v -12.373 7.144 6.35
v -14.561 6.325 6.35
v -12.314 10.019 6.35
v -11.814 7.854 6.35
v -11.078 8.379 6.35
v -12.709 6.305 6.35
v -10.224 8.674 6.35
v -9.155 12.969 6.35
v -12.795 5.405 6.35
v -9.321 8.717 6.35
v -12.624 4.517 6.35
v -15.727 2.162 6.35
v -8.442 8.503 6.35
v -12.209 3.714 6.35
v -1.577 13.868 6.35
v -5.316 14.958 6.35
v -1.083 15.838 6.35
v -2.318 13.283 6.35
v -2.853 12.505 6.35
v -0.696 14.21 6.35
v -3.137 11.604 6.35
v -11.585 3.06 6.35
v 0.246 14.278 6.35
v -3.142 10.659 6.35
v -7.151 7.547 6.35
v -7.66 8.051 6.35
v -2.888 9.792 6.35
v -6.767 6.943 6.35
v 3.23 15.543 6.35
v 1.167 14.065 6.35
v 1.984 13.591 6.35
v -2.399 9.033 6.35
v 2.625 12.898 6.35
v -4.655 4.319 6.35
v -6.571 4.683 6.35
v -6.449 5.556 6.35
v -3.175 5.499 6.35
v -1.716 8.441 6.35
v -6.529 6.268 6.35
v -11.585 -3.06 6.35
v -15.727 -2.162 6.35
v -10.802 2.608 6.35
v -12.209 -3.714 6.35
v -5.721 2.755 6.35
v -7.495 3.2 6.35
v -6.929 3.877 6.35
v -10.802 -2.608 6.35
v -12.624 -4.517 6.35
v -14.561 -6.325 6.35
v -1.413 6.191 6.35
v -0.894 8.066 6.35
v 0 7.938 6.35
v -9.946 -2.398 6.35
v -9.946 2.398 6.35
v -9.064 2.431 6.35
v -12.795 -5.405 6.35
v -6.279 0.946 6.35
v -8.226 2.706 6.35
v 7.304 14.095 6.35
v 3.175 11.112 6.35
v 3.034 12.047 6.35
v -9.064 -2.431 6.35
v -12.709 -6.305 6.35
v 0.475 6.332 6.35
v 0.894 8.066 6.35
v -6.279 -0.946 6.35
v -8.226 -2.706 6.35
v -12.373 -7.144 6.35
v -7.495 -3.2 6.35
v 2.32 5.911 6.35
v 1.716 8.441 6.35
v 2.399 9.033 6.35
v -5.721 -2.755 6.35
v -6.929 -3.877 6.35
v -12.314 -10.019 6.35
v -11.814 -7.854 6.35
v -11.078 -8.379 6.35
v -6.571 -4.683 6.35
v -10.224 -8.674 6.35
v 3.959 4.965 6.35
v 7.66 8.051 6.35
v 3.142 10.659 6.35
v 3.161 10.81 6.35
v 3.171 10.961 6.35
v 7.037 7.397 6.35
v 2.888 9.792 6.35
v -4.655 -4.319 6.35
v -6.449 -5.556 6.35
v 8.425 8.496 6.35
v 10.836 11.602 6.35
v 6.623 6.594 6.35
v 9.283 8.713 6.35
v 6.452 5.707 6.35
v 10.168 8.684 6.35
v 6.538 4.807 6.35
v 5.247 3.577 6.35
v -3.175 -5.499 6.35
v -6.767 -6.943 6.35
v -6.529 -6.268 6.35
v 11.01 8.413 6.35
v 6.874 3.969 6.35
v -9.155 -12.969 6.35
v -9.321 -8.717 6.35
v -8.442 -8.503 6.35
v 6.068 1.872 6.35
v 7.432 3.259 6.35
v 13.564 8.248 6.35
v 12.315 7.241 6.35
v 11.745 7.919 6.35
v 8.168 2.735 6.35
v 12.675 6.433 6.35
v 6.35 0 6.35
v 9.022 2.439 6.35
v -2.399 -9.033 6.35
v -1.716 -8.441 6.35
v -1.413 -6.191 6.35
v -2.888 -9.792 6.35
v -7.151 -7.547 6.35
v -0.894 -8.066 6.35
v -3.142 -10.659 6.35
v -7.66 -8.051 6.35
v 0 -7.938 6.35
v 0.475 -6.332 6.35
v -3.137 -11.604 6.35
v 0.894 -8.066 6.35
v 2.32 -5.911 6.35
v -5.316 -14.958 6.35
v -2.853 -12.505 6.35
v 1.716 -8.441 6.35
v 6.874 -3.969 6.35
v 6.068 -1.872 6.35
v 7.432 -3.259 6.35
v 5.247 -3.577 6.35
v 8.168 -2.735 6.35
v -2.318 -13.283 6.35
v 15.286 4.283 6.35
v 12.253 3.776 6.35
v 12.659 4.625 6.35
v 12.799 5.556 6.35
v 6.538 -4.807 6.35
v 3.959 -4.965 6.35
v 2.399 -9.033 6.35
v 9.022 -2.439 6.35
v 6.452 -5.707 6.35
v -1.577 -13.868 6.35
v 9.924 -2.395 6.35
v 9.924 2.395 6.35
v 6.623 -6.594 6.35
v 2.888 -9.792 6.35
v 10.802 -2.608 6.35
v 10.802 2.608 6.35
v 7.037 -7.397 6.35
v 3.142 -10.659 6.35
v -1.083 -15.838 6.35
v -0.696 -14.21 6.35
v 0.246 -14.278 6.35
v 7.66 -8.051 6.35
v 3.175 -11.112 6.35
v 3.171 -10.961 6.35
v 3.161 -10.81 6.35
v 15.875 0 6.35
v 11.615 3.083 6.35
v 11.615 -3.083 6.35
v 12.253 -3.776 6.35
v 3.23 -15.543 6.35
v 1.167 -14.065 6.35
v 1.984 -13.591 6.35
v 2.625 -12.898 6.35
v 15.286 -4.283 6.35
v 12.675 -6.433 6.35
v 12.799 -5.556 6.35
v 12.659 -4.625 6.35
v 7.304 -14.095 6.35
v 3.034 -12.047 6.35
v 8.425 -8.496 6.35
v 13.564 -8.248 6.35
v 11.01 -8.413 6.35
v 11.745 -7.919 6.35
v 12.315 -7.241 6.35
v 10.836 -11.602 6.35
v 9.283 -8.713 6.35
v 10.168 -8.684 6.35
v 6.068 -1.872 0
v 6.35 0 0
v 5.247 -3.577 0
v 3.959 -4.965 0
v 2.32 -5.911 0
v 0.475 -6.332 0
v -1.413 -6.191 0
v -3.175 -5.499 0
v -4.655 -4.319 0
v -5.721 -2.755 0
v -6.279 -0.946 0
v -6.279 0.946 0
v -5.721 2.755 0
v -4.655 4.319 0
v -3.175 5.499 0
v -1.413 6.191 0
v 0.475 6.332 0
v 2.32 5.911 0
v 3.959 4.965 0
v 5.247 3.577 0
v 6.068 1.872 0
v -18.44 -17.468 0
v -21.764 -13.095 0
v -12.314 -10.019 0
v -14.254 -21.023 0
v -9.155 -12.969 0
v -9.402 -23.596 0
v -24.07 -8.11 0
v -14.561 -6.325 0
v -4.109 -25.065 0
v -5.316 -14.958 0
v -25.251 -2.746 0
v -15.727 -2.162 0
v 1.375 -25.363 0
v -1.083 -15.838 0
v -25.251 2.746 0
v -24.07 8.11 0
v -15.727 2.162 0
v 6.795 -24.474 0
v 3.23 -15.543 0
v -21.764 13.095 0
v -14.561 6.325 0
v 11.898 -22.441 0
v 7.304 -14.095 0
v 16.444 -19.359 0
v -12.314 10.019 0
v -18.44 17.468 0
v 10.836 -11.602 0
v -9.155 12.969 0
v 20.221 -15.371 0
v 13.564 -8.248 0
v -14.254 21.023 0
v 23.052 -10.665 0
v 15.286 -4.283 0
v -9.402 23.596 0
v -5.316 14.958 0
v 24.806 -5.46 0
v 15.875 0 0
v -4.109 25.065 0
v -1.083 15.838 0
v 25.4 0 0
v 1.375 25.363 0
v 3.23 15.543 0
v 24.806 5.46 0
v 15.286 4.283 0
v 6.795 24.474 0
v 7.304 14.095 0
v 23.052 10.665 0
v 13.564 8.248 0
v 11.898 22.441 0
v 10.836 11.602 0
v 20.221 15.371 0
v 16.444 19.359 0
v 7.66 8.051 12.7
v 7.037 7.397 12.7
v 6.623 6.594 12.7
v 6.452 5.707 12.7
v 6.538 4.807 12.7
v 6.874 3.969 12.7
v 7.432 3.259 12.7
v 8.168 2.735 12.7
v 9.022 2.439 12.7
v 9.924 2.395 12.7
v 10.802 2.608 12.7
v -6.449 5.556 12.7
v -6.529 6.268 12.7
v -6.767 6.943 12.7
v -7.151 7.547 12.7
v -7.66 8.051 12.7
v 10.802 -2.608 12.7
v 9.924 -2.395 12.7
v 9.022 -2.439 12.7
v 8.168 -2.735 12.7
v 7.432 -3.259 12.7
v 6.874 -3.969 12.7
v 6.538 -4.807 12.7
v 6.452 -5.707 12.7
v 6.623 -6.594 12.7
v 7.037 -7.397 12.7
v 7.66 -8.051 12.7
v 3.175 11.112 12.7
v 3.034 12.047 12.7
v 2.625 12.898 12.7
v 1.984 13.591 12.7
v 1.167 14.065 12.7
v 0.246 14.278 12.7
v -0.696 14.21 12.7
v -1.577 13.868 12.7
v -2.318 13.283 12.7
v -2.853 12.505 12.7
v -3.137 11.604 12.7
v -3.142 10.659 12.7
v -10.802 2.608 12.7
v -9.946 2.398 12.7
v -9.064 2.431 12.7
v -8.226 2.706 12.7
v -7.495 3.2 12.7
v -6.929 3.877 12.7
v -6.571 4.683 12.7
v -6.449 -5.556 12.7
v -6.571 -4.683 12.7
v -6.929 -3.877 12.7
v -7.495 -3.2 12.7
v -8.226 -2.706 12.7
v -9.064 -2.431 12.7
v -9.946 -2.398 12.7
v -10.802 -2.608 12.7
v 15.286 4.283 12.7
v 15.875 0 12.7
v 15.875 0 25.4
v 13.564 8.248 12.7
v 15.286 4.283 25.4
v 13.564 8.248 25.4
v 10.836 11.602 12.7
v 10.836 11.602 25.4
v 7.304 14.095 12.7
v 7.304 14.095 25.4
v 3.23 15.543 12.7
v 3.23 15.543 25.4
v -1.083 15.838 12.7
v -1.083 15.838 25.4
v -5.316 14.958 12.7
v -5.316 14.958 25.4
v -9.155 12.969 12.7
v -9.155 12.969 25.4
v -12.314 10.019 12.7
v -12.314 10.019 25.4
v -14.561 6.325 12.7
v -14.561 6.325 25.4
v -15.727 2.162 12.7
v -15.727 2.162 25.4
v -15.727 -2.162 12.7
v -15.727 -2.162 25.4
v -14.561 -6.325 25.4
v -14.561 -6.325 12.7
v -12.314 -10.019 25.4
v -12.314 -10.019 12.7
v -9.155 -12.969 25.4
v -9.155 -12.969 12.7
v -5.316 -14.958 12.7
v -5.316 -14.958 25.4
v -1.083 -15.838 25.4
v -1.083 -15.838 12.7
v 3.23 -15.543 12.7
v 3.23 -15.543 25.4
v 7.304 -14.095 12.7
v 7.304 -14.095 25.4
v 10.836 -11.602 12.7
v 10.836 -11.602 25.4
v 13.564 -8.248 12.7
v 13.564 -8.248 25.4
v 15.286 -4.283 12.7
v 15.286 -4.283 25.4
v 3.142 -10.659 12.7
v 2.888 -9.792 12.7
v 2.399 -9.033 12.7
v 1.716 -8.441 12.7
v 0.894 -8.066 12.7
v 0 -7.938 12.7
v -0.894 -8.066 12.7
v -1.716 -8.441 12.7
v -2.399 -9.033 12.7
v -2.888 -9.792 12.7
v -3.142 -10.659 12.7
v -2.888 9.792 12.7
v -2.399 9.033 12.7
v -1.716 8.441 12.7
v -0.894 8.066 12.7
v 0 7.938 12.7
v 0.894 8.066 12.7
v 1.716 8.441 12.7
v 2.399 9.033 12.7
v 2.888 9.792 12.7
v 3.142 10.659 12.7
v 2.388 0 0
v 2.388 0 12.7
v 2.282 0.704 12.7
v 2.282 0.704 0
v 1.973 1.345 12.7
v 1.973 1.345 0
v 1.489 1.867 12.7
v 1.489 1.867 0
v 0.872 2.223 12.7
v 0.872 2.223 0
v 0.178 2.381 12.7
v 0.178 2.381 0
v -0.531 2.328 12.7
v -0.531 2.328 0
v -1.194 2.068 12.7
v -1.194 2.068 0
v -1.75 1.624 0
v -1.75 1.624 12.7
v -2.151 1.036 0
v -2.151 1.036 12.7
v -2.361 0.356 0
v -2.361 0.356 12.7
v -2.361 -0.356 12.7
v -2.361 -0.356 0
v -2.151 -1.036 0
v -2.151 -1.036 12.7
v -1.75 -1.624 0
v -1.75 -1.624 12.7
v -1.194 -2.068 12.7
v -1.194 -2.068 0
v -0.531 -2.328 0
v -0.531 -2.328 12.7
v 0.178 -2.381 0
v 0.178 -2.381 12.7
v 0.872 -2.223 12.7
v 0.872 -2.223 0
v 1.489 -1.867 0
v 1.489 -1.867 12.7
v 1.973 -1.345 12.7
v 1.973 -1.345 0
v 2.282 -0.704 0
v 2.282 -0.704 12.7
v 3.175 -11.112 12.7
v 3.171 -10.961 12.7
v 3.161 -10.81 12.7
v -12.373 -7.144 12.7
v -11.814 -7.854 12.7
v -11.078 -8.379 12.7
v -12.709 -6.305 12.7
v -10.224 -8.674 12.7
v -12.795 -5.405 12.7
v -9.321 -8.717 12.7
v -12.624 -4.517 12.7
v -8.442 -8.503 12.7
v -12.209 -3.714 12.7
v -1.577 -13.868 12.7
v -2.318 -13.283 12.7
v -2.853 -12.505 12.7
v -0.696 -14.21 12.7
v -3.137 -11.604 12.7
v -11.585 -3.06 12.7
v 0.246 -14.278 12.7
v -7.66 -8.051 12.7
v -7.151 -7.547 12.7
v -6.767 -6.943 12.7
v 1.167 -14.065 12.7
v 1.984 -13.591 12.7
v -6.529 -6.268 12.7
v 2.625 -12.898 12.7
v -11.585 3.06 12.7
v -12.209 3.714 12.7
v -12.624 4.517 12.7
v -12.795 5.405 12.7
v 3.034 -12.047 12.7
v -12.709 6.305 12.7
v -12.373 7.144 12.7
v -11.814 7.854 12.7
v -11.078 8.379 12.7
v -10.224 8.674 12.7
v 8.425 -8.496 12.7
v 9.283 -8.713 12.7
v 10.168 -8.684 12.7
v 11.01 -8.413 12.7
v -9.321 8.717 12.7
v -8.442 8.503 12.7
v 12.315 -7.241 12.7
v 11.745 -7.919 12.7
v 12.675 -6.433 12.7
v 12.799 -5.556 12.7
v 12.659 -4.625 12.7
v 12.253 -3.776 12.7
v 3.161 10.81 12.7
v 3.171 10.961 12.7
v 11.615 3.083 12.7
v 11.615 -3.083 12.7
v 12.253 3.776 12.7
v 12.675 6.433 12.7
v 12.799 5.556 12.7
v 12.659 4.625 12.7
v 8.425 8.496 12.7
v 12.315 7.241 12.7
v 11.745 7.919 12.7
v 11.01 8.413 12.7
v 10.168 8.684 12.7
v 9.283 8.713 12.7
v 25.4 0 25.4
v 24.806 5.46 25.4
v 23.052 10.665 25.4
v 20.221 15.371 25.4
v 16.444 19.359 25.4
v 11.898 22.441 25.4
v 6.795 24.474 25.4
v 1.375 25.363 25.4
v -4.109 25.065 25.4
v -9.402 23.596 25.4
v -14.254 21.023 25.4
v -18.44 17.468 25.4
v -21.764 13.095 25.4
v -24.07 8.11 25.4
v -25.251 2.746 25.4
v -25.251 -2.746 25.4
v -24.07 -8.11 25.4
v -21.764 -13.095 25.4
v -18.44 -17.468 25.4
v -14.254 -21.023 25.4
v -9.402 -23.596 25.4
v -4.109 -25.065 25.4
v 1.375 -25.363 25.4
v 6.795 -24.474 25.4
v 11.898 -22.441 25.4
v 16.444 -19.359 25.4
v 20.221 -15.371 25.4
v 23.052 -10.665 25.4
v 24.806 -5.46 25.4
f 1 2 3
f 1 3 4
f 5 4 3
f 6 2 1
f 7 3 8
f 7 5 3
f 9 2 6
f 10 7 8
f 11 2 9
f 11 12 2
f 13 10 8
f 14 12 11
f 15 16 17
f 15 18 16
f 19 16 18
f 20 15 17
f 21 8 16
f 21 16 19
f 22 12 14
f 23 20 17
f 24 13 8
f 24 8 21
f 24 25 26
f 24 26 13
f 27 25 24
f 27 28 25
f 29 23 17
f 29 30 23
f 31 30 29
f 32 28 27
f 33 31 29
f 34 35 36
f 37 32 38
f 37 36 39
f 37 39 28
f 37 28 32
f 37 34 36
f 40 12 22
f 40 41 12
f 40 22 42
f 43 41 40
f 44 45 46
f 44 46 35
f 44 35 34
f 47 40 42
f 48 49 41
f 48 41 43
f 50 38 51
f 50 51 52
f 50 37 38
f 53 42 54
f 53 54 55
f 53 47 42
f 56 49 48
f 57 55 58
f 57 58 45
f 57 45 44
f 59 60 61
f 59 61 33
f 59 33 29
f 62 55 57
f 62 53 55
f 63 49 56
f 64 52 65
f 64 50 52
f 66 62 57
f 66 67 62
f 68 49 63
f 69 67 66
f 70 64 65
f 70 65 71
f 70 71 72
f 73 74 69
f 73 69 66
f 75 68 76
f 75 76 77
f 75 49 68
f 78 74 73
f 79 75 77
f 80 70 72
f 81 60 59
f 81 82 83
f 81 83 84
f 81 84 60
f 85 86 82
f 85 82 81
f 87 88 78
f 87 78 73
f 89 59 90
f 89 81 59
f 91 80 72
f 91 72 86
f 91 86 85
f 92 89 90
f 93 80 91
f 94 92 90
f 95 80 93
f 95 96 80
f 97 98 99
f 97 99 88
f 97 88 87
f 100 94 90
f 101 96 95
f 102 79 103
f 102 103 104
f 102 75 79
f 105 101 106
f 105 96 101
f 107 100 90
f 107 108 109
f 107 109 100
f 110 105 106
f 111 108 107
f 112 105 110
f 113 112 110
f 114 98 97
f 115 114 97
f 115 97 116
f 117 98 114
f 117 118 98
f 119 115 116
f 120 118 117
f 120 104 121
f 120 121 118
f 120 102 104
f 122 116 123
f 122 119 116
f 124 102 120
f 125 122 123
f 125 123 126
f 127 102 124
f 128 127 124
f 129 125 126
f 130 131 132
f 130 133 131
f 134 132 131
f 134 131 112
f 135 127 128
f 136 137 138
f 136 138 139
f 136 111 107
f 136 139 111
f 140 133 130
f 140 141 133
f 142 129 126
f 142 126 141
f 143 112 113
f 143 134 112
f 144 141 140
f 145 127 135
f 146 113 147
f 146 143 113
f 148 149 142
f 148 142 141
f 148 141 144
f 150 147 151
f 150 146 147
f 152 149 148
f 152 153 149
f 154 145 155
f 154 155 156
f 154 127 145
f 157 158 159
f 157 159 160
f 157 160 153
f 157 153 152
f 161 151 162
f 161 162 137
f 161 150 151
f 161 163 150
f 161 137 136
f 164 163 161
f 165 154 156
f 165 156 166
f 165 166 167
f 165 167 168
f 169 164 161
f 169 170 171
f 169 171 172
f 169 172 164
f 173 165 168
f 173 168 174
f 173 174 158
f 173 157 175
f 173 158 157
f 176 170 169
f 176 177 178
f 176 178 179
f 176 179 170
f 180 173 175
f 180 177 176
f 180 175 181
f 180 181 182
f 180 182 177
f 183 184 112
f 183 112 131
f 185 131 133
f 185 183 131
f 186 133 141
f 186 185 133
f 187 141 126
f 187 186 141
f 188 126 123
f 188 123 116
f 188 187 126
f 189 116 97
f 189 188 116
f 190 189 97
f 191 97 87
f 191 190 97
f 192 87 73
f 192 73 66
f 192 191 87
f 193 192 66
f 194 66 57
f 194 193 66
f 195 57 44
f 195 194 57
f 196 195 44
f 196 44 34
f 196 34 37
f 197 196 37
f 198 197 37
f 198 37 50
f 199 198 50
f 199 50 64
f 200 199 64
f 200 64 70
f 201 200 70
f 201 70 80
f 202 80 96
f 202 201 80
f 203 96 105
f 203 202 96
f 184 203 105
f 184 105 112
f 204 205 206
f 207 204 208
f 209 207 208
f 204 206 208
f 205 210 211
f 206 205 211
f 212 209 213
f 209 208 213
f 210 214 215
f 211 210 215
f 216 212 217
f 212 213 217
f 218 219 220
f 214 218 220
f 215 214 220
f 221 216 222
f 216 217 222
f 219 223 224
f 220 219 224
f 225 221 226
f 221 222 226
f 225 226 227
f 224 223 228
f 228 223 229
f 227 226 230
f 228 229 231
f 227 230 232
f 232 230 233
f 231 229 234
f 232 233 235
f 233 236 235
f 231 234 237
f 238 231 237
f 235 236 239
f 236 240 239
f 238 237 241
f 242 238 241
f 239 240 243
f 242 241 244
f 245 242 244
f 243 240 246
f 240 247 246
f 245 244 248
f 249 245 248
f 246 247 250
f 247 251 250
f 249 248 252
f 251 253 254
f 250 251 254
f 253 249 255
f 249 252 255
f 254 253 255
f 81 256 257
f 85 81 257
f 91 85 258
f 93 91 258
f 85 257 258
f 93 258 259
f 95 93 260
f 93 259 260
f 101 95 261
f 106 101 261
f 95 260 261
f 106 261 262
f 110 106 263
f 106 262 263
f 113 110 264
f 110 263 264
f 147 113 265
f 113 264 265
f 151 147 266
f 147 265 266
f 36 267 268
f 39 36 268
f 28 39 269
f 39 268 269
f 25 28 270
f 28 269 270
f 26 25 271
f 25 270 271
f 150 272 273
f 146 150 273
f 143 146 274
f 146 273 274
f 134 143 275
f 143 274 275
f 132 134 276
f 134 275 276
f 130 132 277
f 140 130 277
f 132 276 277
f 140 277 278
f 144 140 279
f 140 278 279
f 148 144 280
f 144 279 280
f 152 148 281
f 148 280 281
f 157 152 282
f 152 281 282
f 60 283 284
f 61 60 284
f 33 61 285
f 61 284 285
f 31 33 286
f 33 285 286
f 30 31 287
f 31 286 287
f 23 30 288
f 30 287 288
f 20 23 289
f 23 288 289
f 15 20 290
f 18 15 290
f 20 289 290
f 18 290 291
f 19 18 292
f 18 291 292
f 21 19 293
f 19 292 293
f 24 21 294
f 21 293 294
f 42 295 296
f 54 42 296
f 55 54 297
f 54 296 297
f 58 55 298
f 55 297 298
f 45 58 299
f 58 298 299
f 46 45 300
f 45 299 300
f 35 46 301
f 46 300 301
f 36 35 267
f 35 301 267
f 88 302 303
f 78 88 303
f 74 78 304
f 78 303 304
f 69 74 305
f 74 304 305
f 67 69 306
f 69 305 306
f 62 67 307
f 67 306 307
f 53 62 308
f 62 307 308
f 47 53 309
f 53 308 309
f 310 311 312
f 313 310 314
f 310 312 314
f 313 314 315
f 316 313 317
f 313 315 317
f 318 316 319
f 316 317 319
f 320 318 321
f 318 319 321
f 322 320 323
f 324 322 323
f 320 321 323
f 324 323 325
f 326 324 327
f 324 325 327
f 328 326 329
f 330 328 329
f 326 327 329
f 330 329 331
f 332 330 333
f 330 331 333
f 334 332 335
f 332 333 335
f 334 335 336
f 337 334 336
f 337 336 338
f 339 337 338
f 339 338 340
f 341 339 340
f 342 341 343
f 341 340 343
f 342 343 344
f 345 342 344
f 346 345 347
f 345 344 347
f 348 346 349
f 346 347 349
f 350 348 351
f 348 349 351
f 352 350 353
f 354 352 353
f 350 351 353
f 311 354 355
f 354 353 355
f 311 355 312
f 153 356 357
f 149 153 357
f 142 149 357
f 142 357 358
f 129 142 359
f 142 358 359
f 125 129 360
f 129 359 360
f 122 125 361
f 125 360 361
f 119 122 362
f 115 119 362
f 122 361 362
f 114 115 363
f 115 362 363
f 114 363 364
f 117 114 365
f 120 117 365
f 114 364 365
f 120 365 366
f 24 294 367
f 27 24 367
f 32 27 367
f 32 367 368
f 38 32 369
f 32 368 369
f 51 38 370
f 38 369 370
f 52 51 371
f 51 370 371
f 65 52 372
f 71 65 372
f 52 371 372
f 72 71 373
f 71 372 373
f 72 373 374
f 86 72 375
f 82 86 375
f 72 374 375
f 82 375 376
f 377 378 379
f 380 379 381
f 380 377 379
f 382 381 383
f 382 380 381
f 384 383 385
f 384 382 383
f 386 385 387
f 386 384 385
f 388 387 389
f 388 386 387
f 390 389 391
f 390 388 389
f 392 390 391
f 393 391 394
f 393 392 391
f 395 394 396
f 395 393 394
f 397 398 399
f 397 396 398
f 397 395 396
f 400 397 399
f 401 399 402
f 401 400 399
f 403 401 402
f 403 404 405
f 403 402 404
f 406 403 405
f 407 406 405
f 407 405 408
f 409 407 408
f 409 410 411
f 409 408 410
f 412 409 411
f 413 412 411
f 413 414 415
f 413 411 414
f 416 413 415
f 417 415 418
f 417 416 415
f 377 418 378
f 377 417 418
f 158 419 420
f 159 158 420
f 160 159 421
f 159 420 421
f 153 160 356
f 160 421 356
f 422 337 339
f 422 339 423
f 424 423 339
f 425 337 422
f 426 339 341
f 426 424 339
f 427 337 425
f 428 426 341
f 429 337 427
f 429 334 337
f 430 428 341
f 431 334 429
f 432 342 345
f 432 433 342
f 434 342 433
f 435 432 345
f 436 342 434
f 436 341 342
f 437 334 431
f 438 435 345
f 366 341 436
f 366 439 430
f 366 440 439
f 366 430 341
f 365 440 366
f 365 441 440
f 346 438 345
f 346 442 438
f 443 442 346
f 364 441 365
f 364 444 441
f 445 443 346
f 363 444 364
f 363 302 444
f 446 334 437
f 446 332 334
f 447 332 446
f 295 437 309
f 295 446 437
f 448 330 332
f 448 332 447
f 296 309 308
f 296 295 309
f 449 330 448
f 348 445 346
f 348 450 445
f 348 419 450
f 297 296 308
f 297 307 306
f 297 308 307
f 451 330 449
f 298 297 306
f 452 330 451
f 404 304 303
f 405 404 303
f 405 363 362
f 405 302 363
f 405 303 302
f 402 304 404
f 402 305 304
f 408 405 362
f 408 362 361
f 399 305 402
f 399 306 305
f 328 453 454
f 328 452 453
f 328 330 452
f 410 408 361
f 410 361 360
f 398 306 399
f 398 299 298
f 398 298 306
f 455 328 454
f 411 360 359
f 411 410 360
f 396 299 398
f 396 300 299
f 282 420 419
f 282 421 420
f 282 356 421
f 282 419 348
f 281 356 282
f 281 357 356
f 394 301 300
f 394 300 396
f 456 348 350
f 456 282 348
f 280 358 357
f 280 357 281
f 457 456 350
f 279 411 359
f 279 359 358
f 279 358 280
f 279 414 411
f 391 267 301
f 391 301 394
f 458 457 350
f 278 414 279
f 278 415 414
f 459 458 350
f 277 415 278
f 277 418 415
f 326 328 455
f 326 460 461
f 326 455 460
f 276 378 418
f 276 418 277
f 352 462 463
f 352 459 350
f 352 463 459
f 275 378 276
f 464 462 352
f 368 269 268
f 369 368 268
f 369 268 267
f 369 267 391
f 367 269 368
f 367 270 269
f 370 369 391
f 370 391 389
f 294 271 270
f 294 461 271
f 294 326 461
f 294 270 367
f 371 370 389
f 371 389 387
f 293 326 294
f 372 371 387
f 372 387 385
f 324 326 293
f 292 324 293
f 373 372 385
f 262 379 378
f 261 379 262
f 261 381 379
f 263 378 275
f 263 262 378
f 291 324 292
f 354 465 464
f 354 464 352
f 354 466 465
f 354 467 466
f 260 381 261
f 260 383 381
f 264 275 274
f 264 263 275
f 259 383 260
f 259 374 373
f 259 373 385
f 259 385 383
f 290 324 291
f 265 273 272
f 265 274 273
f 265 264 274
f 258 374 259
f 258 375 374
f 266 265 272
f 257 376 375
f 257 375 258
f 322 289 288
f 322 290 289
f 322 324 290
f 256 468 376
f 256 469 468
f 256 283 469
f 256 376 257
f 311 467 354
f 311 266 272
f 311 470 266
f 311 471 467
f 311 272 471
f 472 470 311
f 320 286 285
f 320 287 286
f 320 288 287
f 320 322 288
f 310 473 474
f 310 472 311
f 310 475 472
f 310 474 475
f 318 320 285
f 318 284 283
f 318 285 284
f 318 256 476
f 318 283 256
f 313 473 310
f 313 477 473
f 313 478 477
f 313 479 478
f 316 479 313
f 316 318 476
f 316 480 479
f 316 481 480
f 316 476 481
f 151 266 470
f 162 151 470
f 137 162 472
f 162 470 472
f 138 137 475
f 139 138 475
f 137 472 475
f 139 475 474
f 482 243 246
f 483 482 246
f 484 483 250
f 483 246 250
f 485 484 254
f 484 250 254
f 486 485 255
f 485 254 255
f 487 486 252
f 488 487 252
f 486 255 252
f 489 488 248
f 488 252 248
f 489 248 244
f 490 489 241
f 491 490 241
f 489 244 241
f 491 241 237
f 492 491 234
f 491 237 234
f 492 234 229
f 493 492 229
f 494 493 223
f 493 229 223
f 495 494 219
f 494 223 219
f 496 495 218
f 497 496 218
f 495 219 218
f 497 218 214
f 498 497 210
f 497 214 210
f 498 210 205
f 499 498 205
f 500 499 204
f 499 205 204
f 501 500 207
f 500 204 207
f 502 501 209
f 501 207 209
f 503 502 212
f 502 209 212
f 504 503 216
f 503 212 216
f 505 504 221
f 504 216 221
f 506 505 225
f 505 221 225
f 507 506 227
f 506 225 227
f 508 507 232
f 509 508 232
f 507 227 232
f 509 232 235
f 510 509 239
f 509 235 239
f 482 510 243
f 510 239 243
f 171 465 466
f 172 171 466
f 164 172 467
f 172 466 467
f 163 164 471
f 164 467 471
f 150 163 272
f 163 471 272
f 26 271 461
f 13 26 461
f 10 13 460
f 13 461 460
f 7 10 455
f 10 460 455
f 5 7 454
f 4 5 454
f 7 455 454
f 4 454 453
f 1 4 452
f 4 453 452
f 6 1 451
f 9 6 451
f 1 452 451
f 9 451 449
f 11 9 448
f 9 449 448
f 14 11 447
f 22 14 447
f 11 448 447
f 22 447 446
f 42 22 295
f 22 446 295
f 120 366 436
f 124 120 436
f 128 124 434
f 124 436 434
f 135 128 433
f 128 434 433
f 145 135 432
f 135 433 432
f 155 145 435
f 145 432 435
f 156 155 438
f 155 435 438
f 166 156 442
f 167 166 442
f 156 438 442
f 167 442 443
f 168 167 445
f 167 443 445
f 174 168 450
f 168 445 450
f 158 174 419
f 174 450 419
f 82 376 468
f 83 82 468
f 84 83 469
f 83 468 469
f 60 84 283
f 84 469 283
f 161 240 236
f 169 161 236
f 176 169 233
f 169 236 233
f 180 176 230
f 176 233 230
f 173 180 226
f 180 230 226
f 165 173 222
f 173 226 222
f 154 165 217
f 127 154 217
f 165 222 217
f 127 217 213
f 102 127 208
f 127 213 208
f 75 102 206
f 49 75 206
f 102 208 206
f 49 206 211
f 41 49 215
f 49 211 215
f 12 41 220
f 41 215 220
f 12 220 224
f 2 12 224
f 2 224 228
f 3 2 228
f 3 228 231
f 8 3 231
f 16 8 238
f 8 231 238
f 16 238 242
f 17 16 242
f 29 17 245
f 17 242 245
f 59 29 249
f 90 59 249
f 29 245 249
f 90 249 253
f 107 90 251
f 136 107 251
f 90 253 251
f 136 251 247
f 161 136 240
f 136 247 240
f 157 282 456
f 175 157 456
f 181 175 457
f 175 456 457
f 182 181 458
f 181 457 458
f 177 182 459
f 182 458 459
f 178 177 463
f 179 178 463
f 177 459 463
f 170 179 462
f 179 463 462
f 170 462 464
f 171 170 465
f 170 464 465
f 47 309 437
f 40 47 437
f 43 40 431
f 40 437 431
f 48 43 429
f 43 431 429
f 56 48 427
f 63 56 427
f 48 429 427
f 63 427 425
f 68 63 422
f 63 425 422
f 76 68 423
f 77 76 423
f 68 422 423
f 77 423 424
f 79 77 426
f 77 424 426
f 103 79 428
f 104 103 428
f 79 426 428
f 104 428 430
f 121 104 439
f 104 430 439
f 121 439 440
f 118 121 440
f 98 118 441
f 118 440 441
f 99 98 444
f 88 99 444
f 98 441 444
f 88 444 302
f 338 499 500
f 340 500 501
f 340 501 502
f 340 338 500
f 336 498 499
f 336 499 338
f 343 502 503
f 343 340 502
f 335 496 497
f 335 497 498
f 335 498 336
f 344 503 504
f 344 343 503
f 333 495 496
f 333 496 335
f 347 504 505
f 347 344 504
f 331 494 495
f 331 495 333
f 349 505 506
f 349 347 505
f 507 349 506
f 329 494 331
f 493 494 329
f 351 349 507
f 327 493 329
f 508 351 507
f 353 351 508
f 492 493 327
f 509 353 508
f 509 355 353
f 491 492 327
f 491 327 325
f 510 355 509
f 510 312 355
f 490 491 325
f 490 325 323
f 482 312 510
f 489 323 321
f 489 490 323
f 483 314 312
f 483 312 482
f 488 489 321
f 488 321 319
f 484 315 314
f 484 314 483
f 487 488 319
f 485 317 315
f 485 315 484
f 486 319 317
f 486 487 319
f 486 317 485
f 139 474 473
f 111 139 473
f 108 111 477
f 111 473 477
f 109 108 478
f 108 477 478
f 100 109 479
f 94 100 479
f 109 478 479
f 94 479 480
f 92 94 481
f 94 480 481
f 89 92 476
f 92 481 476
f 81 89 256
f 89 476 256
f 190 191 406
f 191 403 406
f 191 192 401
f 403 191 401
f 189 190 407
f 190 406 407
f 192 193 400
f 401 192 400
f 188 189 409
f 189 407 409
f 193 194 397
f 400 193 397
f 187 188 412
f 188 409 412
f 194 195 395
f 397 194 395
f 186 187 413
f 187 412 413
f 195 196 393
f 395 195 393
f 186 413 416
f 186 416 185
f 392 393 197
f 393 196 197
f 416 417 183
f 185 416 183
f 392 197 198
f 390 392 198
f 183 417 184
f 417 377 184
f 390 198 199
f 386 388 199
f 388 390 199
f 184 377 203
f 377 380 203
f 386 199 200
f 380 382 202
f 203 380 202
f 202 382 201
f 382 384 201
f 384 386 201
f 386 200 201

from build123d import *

# Parameters (mm, degrees)
F0_R     = 25.4
F0_R_2   = 2.3876
F1_DEPTH = 25.4
F2_R     = 15.875
F3_DEPTH = 12.7
F4_R     = 15.875
F4_R_2   = 6.35
F5_DEPTH = 6.35
F6_R     = 2.3876
F7_DEPTH = 12.701


with BuildPart() as f1:
    # F0 (on Top) → F1 (new body)
    with BuildSketch(Plane.XY):
        Circle(F0_R)
        Circle(F0_R_2, mode=Mode.SUBTRACT)
    extrude(amount=F1_DEPTH)

    # F2 (on face) → F3 (cut)
    with BuildSketch(Plane.XY.offset(25.4)):
        Circle(F2_R)
    extrude(amount=-F3_DEPTH, mode=Mode.SUBTRACT)

    # F4 (on face) → F5 (cut)
    with BuildSketch(Plane(origin=(0, 0, 0), x_dir=(1, 0, 0), z_dir=(0, 0, -1))):
        Circle(F4_R)
        Circle(F4_R_2, mode=Mode.SUBTRACT)
    extrude(amount=-F5_DEPTH, mode=Mode.SUBTRACT)

    # F6 (on face) → F7 (cut, through all)
    with BuildSketch(Plane.XY.offset(12.7)):
        with BuildLine():
            ThreePointArc((7.6596854017, 8.0508928571), (6.8740766425, 3.96875), (10.8021204383, 2.6080357143))
            ThreePointArc((10.8021204383, 2.6080357143), (9.6237072996, 5.55625), (7.6596854017, 8.0508928571))
        make_face()
        with BuildLine():
            ThreePointArc((7.6596854017, 8.0508928571), (9.6237072996, 5.55625), (10.8021204383, 2.6080357143))
            ThreePointArc((10.8021204383, 2.6080357143), (12.2525936337, 3.775918109), (12.7987072996, 5.55625))
            ThreePointArc((12.7987072996, 5.55625), (11.010223703, 8.4125058119), (7.6596854017, 8.0508928571))
        make_face()
        with BuildLine():
            ThreePointArc((12.7987072996, -5.55625), (12.2525936337, -3.775918109), (10.8021204383, -2.6080357143))
            ThreePointArc((10.8021204383, -2.6080357143), (9.6237072996, -5.55625), (7.6596854017, -8.0508928571))
            ThreePointArc((7.6596854017, -8.0508928571), (11.010223703, -8.4125058119), (12.7987072996, -5.55625))
        make_face()
        with BuildLine():
            ThreePointArc((7.6596854017, -8.0508928571), (9.6237072996, -5.55625), (10.8021204383, -2.6080357143))
            ThreePointArc((10.8021204383, -2.6080357143), (6.8740766425, -3.96875), (7.6596854017, -8.0508928571))
        make_face()
        with BuildLine():
            ThreePointArc((-3.1424350366, 10.6589285714), (0, 7.9375), (3.1424350366, 10.6589285714))
            ThreePointArc((3.1424350366, 10.6589285714), (0, 11.1125), (-3.1424350366, 10.6589285714))
        make_face()
        with BuildLine():
            ThreePointArc((-3.1424350366, 10.6589285714), (0, 11.1125), (3.1424350366, 10.6589285714))
            ThreePointArc((3.1424350366, 10.6589285714), (3.1668482945, 10.8851305222), (3.175, 11.1125))
            ThreePointArc((3.175, 11.1125), (-0.2273694778, 14.2793482945), (-3.1424350366, 10.6589285714))
        make_face()
        with BuildLine():
            ThreePointArc((3.175, -11.1125), (3.1668482945, -10.8851305222), (3.1424350366, -10.6589285714))
            ThreePointArc((3.1424350366, -10.6589285714), (0, -11.1125), (-3.1424350366, -10.6589285714))
            ThreePointArc((-3.1424350366, -10.6589285714), (-0.2273694778, -14.2793482945), (3.175, -11.1125))
        make_face()
        with BuildLine():
            ThreePointArc((-3.1424350366, -10.6589285714), (0, -11.1125), (3.1424350366, -10.6589285714))
            ThreePointArc((3.1424350366, -10.6589285714), (0, -7.9375), (-3.1424350366, -10.6589285714))
        make_face()
        with BuildLine():
            ThreePointArc((-6.4487072996, 5.55625), (-6.7674514877, 6.9427664035), (-7.6596854017, 8.0508928571))
            ThreePointArc((-7.6596854017, 8.0508928571), (-9.6237072996, 5.55625), (-10.8021204383, 2.6080357143))
            ThreePointArc((-10.8021204383, 2.6080357143), (-7.8433754085, 2.9273636659), (-6.4487072996, 5.55625))
        make_face()
        with BuildLine():
            ThreePointArc((-10.8021204383, 2.6080357143), (-9.6237072996, 5.55625), (-7.6596854017, 8.0508928571))
            ThreePointArc((-7.6596854017, 8.0508928571), (-12.3733379566, 7.14375), (-10.8021204383, 2.6080357143))
        make_face()
        with BuildLine():
            ThreePointArc((-10.8021204383, -2.6080357143), (-12.3733379566, -7.14375), (-7.6596854017, -8.0508928571))
            ThreePointArc((-7.6596854017, -8.0508928571), (-9.6237072996, -5.55625), (-10.8021204383, -2.6080357143))
        make_face()
        with BuildLine():
            ThreePointArc((-10.8021204383, -2.6080357143), (-9.6237072996, -5.55625), (-7.6596854017, -8.0508928571))
            ThreePointArc((-7.6596854017, -8.0508928571), (-6.7674514877, -6.9427664035), (-6.4487072996, -5.55625))
            ThreePointArc((-6.4487072996, -5.55625), (-7.8433754085, -2.9273636659), (-10.8021204383, -2.6080357143))
        make_face()
        Circle(F6_R)
    extrude(amount=-F7_DEPTH, mode=Mode.SUBTRACT)


solid = f1.part
